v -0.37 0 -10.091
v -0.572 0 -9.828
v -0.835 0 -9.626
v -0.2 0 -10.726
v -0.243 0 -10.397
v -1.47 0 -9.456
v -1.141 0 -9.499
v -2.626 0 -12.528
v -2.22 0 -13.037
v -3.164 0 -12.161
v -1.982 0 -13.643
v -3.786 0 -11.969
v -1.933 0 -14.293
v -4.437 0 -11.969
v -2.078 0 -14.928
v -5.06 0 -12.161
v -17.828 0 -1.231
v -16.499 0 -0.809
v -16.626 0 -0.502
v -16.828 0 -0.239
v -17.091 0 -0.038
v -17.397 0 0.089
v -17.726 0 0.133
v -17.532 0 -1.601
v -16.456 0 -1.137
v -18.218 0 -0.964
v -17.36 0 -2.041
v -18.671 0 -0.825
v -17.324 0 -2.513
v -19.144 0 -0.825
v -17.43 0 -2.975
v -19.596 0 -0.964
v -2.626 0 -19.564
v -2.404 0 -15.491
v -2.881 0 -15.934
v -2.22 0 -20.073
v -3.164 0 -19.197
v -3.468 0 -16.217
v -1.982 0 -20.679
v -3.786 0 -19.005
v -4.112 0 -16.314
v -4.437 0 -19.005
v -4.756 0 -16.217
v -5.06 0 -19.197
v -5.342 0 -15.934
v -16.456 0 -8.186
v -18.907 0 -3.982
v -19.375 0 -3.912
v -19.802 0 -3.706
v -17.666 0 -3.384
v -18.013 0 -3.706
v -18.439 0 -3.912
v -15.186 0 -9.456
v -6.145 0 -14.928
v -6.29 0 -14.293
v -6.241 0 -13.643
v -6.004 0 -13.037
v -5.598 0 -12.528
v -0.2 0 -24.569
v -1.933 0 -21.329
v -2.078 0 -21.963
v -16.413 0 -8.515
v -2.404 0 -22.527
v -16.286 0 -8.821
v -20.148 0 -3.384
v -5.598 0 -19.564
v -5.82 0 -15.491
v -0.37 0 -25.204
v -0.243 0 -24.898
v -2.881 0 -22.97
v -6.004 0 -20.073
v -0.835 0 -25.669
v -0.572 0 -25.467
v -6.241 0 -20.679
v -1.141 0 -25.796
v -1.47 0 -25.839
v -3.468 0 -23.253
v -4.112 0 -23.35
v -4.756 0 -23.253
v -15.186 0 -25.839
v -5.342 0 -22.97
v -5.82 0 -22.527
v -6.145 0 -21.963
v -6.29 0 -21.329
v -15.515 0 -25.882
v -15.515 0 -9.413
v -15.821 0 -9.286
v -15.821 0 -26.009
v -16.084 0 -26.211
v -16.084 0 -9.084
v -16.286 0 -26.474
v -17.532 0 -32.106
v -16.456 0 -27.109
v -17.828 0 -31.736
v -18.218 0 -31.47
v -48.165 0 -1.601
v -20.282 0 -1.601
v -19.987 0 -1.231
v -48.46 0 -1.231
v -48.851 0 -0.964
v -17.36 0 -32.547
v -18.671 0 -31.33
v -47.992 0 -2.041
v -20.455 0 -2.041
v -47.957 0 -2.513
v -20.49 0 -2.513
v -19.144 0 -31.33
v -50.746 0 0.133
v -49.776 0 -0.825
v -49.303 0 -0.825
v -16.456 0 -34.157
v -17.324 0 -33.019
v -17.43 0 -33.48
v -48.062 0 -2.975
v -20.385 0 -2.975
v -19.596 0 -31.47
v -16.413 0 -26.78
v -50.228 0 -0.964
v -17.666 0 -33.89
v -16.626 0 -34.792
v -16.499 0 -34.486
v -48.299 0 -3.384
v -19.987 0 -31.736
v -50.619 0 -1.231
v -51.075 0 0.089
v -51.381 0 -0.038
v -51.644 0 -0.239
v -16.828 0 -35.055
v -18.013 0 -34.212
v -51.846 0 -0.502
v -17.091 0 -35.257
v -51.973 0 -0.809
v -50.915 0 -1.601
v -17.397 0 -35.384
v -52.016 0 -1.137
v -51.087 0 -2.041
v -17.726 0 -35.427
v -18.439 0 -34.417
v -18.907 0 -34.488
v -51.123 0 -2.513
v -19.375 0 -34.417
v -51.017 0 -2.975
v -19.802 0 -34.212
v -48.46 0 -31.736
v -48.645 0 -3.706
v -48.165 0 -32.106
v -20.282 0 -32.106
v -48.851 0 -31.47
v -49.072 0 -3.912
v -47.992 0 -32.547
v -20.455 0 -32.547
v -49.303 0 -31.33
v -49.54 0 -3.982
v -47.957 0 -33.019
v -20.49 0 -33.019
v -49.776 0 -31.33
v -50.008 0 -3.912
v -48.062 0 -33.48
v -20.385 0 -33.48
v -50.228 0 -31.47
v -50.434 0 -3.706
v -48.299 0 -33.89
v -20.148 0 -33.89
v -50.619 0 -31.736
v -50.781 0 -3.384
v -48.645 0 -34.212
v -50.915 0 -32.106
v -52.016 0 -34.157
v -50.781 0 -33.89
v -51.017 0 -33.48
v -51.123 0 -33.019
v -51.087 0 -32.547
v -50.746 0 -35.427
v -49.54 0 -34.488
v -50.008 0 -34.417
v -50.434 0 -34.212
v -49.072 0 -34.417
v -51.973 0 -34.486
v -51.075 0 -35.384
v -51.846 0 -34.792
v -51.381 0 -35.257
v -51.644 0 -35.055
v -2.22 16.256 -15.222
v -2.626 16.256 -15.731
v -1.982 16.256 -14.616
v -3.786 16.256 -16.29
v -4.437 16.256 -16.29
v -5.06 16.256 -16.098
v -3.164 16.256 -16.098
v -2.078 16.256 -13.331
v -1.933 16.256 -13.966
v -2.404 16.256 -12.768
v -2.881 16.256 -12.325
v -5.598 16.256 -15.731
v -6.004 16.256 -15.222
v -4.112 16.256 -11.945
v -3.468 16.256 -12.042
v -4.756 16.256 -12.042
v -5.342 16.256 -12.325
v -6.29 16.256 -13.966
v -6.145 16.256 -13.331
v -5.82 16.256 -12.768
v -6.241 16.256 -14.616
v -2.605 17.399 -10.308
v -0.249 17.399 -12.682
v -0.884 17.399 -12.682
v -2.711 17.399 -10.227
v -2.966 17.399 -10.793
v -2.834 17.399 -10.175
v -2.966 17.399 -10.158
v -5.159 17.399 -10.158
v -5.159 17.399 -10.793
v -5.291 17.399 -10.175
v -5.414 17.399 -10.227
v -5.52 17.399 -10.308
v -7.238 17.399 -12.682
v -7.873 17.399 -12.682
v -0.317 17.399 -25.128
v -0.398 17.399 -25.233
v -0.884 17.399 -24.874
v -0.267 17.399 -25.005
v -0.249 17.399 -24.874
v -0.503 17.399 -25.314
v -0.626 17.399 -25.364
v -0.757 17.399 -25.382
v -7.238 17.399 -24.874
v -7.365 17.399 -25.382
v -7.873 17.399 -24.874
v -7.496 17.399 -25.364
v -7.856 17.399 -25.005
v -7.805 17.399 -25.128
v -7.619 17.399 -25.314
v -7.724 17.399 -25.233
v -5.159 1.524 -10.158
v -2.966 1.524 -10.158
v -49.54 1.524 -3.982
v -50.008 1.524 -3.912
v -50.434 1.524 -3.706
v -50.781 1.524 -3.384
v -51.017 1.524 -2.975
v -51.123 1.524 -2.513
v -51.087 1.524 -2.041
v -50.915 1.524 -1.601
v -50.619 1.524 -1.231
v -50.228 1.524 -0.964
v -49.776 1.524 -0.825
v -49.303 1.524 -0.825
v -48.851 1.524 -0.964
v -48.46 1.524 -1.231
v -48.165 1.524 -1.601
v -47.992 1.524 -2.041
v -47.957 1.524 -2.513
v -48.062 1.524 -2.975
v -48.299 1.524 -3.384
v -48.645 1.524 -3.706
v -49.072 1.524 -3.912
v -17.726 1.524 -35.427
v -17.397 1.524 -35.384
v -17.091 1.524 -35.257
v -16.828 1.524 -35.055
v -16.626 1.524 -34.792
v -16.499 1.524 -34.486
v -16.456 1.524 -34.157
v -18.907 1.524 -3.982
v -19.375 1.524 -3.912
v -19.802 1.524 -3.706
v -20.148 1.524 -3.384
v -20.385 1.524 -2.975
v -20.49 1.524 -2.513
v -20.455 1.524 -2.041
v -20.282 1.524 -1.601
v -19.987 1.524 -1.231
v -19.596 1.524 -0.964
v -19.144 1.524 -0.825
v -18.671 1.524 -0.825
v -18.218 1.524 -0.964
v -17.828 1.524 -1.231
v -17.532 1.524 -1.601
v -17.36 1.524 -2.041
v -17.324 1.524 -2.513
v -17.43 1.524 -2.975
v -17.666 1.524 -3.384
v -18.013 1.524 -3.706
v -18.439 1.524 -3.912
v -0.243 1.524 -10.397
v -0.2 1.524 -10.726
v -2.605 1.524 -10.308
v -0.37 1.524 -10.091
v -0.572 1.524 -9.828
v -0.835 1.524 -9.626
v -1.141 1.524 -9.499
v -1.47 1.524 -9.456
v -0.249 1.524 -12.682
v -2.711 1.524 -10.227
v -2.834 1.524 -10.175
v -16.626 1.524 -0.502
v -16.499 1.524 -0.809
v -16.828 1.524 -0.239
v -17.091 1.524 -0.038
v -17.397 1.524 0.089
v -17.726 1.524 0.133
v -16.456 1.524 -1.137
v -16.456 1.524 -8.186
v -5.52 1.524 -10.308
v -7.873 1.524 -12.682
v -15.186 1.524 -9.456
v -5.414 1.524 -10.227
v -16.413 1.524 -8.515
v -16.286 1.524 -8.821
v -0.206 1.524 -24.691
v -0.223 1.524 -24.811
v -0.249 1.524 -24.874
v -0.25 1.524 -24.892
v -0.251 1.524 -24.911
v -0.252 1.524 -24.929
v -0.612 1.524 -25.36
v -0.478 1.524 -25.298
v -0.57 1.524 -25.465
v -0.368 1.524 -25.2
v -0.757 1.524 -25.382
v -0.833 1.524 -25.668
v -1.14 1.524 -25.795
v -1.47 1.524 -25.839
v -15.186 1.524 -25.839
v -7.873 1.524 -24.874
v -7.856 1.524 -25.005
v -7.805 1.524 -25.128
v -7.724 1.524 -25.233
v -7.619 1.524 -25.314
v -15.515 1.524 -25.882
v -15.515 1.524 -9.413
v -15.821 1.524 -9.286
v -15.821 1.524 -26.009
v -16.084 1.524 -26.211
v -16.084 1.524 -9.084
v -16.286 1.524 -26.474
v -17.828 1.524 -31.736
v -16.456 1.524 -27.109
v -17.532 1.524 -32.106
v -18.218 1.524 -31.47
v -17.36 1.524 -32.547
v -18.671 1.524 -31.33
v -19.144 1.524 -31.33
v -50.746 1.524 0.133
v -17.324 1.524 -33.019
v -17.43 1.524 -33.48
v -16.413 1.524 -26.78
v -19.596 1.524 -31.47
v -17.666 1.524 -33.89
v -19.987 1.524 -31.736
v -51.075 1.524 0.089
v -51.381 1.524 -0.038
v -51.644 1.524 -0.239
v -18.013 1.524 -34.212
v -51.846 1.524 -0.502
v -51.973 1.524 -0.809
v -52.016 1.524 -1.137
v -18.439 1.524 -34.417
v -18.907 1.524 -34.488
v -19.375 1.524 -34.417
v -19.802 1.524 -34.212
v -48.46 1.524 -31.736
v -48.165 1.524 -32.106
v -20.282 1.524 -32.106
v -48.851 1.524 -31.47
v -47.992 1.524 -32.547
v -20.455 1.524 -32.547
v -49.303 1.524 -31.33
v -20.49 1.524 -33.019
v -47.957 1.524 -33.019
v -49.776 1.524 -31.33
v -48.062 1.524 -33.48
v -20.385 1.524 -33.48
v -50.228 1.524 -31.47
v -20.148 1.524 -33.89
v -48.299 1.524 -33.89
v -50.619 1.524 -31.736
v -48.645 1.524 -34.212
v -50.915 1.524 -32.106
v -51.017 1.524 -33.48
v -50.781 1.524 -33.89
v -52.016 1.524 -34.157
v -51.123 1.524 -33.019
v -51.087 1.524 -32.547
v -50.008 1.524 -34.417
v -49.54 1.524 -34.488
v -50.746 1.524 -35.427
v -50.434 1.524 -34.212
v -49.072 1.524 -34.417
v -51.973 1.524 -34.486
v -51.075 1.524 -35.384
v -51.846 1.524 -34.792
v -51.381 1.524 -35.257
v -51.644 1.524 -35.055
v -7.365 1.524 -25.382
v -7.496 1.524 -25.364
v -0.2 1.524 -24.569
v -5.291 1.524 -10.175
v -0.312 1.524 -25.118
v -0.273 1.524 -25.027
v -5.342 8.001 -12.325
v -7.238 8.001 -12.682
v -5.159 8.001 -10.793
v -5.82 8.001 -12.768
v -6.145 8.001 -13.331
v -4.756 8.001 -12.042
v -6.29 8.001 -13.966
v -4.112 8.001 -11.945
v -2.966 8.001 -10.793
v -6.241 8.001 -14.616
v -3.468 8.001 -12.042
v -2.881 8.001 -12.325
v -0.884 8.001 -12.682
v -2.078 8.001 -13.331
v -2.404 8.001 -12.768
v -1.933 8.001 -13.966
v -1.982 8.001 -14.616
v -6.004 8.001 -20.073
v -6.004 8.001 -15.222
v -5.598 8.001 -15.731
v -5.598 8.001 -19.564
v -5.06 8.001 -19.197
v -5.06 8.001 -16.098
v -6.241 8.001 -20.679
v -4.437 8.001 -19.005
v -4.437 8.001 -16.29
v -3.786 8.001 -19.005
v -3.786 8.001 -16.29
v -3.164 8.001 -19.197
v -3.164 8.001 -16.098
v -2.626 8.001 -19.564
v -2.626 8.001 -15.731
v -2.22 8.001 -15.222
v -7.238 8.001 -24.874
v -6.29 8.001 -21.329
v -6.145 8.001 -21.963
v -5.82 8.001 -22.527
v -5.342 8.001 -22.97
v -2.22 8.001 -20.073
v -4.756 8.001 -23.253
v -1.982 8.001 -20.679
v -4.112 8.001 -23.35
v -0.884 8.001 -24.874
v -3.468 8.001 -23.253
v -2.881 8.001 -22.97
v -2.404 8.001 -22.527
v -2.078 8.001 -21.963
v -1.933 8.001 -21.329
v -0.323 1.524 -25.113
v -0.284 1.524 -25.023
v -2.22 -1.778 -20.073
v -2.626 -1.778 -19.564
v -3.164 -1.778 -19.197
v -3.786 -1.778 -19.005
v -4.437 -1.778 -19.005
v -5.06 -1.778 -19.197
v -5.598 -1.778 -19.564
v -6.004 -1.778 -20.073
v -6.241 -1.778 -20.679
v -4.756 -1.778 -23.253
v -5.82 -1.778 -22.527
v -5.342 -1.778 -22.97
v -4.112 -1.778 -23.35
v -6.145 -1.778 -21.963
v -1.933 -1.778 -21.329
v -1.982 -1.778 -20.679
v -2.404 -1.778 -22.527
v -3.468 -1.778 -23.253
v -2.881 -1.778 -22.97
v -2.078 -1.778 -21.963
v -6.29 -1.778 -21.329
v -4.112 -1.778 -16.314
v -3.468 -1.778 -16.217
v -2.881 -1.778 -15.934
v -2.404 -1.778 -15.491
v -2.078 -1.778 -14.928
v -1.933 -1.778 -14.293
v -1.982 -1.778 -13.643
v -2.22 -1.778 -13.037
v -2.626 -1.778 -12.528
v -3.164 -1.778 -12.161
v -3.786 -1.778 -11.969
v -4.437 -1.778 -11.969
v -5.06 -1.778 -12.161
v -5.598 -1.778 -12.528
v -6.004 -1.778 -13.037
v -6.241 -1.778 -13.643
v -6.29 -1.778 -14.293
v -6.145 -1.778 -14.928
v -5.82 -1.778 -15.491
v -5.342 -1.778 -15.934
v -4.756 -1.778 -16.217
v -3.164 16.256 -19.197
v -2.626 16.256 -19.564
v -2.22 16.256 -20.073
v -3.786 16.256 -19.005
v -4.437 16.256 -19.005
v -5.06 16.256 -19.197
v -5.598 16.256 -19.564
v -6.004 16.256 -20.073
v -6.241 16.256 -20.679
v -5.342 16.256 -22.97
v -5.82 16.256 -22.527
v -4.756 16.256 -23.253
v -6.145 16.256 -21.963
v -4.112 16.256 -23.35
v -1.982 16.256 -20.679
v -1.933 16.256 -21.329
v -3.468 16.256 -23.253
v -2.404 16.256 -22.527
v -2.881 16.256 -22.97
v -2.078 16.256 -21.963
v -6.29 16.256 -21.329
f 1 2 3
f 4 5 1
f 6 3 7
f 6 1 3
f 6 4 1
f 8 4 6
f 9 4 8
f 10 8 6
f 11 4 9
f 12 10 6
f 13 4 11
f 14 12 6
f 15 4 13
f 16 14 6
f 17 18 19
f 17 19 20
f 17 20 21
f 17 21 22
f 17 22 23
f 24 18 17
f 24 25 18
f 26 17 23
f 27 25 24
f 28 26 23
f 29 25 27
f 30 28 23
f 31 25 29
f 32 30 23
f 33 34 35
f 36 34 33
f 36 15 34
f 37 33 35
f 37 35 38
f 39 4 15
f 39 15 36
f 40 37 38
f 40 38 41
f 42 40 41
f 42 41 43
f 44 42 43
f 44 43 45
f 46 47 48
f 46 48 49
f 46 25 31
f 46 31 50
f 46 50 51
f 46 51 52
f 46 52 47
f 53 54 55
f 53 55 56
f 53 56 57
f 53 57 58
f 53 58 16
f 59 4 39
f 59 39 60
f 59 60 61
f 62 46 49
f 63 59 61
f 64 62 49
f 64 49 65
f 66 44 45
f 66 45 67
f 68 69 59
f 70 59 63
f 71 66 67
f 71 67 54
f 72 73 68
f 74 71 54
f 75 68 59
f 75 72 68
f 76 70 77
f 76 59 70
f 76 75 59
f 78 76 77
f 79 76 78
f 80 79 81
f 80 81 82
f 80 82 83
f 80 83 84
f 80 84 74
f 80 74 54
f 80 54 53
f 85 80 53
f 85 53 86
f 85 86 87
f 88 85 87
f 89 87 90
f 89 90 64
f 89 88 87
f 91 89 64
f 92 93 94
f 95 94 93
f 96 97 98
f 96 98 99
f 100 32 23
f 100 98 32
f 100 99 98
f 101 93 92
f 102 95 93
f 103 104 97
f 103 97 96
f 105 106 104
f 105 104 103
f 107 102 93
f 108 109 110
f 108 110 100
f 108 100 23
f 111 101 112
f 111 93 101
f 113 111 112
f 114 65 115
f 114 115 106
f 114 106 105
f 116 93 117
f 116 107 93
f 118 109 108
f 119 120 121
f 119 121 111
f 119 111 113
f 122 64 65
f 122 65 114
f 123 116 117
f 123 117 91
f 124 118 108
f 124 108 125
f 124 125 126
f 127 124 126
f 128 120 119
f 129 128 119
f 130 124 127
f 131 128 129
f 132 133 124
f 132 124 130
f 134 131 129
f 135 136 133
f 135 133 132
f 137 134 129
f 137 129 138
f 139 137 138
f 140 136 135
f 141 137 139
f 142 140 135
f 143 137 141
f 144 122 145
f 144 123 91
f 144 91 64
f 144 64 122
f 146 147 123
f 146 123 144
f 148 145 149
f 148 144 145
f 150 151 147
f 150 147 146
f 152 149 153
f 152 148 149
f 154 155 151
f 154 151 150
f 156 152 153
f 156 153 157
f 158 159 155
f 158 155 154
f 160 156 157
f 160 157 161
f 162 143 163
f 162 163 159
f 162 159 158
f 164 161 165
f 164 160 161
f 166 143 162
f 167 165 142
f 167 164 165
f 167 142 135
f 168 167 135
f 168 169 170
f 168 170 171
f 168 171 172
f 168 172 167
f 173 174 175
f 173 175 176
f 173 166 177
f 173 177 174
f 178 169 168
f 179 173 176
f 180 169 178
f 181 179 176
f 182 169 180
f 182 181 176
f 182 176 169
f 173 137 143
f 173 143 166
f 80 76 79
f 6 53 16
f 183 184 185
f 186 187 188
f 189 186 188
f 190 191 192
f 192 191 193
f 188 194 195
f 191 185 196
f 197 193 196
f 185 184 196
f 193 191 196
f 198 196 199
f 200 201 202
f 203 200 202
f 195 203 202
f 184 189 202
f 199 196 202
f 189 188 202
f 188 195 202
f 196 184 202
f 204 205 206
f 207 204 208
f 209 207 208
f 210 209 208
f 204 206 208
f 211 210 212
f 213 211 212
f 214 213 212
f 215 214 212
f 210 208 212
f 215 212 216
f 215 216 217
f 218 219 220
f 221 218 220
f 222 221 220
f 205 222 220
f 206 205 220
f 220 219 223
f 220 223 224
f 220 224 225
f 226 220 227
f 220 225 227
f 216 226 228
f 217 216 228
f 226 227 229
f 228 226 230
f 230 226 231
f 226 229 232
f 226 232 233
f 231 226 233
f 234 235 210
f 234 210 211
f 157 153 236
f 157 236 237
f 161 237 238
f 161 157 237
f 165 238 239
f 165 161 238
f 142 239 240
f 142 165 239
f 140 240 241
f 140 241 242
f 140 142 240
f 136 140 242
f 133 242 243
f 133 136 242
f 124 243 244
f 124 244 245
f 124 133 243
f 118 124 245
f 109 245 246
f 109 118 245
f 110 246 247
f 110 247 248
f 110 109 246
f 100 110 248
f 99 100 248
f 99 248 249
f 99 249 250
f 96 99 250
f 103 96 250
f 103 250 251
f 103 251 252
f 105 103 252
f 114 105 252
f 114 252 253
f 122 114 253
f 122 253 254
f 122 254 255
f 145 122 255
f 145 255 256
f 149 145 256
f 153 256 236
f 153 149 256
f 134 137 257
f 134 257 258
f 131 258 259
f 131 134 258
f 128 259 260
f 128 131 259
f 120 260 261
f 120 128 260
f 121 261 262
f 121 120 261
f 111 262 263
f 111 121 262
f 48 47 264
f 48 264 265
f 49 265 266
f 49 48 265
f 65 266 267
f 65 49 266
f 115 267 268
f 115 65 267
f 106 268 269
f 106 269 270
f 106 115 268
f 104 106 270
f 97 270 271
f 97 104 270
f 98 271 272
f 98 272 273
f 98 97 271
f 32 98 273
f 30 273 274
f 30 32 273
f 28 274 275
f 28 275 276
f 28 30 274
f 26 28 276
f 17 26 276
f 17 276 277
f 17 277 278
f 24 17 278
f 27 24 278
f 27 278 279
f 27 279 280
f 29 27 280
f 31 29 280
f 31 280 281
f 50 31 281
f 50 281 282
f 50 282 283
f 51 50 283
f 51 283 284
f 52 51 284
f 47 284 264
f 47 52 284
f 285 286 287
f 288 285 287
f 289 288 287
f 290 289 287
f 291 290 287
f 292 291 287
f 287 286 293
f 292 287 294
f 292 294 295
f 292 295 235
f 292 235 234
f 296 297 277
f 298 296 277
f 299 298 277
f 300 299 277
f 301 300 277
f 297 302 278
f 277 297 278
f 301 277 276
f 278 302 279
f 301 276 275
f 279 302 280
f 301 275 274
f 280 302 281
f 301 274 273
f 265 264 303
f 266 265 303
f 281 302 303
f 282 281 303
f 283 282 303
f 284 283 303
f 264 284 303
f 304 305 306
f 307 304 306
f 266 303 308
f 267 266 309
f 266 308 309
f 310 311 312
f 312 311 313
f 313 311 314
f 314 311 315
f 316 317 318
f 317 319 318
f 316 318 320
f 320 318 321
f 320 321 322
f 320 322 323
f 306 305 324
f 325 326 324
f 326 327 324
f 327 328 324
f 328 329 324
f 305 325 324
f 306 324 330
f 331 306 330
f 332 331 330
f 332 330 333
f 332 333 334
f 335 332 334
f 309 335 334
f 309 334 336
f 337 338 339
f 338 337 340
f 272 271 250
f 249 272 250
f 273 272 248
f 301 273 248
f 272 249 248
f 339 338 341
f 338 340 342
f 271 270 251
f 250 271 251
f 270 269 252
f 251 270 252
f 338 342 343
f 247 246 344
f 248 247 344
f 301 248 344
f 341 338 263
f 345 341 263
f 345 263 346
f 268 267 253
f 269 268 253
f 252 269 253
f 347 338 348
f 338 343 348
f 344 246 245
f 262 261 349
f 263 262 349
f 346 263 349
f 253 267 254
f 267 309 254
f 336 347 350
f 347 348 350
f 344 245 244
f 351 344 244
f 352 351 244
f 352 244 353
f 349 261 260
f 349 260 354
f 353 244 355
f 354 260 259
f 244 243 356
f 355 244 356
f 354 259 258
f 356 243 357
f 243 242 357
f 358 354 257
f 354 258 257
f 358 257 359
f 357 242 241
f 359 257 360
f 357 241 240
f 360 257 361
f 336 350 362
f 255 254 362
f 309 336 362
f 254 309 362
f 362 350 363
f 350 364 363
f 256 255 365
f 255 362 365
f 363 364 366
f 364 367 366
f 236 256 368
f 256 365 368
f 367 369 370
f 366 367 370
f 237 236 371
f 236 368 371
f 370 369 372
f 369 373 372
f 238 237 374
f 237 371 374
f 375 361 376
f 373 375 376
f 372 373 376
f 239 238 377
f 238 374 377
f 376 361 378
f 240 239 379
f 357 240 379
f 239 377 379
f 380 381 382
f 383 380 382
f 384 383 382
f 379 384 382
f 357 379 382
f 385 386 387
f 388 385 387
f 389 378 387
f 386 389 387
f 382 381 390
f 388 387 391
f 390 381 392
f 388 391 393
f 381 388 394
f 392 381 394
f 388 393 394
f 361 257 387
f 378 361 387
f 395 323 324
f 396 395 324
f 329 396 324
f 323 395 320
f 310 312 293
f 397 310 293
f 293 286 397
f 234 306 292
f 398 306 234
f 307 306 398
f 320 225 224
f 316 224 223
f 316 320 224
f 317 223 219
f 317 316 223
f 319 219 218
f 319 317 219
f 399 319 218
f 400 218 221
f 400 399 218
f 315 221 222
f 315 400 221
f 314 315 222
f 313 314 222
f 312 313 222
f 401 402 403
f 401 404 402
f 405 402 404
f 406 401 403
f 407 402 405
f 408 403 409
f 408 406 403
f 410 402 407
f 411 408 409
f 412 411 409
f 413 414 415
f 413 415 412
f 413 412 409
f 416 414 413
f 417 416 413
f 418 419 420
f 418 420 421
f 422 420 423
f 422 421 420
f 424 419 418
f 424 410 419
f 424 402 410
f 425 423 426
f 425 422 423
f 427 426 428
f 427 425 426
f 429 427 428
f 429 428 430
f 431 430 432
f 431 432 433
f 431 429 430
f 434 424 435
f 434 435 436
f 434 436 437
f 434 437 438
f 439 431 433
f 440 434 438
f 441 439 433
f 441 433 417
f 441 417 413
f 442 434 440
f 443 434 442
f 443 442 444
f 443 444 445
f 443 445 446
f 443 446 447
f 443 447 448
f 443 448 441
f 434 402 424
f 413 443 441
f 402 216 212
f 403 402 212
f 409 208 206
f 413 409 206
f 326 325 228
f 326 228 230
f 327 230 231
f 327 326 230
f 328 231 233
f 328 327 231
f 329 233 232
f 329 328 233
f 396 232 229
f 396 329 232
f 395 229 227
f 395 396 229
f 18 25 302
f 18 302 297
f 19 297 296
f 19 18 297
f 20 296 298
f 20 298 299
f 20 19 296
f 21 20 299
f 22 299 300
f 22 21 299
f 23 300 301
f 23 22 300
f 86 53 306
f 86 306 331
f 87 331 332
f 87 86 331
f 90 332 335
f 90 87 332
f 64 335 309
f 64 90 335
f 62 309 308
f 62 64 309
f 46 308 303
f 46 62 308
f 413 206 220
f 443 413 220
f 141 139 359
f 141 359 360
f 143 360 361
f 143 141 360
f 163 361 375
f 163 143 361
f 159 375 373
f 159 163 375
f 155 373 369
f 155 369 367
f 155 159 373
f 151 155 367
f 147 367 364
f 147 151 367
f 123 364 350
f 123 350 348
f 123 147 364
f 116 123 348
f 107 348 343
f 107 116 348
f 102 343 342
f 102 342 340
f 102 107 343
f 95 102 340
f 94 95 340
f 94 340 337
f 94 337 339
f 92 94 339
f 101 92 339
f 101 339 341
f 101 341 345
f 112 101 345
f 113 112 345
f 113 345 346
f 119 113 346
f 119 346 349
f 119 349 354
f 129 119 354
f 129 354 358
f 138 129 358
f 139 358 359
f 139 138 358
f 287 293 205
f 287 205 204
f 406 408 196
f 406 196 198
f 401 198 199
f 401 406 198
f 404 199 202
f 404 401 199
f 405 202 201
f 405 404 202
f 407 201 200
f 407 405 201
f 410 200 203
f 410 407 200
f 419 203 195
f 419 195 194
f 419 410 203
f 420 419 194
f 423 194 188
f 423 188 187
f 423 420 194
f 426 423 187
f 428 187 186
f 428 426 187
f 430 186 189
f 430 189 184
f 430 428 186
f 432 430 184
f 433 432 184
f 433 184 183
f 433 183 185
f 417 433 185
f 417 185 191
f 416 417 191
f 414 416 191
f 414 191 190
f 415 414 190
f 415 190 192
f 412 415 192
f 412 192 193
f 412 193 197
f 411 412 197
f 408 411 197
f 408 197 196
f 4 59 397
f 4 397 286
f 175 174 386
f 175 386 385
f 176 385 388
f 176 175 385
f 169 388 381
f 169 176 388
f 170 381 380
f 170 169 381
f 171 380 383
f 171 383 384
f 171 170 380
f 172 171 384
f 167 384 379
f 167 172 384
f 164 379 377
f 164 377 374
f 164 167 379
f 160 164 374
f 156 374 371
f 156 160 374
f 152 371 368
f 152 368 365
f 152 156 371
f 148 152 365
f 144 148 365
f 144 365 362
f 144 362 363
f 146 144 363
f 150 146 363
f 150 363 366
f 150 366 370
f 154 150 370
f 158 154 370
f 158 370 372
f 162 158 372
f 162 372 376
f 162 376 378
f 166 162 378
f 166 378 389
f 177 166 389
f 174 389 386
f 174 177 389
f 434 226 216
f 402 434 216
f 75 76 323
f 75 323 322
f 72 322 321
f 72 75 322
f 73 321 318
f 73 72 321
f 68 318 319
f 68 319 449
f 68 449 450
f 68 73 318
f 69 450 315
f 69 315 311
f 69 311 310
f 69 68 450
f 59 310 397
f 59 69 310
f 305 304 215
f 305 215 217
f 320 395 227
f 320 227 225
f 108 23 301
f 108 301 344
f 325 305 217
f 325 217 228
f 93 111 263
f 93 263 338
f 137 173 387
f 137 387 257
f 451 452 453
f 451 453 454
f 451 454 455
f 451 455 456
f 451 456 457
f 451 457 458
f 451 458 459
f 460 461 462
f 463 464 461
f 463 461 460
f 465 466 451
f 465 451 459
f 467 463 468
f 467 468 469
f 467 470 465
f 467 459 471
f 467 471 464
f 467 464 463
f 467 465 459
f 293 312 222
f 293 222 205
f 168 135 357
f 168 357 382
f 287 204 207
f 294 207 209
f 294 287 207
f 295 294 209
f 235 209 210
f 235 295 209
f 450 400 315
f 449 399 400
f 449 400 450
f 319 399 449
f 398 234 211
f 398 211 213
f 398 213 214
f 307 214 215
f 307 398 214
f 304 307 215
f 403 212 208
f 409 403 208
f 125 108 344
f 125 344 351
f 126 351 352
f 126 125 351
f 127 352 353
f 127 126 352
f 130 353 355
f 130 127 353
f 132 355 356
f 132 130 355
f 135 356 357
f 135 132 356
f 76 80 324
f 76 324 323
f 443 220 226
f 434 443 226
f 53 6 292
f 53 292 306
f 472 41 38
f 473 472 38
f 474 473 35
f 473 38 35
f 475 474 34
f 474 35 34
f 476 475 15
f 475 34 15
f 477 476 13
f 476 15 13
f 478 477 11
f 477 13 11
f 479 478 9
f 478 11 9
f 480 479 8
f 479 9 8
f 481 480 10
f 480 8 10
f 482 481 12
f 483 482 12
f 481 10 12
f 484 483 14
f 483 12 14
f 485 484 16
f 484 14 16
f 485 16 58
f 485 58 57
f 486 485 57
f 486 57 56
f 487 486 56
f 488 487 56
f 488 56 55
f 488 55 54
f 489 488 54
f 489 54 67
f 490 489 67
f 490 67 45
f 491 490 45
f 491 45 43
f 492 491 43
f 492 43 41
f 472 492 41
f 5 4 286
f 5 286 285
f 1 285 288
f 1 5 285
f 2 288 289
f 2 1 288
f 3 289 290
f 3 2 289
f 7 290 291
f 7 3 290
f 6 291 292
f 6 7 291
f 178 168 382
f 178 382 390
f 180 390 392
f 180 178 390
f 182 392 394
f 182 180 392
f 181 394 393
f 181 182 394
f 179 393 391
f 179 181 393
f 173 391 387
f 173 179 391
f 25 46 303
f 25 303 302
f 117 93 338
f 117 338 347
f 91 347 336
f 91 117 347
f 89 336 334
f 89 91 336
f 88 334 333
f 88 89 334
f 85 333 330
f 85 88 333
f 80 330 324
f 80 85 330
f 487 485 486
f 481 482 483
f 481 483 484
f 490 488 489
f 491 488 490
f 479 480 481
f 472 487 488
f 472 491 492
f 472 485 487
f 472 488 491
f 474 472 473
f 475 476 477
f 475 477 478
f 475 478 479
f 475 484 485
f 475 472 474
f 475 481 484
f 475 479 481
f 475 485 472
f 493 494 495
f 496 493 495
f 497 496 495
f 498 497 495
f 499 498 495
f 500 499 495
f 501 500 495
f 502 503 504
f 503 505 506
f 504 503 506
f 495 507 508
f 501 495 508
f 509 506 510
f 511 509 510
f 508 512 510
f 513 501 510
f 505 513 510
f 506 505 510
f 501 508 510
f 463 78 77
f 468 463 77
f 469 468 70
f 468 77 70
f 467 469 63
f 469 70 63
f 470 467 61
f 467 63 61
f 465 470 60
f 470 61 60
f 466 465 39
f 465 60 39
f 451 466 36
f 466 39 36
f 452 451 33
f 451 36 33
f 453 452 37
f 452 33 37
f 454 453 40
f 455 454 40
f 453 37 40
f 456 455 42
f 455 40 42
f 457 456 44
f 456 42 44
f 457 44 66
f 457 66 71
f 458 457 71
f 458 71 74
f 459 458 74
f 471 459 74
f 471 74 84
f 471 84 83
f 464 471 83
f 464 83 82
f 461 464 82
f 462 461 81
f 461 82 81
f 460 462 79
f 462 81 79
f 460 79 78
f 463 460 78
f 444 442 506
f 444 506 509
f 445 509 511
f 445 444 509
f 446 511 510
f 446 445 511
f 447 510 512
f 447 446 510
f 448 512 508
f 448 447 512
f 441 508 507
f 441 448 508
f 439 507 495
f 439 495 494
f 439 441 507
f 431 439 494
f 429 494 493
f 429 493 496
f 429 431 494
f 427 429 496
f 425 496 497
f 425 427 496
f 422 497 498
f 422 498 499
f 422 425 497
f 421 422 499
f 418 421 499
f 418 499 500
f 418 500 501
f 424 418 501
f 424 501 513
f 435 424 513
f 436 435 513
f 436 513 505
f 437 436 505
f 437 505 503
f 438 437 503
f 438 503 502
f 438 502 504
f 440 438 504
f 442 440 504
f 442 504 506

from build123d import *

# Parameters (mm, degrees)
SKETCH1_R             = 1.5875
SKETCH1_R_2           = 2.1844
BOSS_EXTRUDE2_DEPTH   = 1.524
BOSS_EXTRUDE3_DEPTH   = 15.875
SKETCH3_R             = 2.1844
BOSS_EXTRUDE4_DEPTH   = 1.778
BOSS_EXTRUDE4_2_DEPTH = 1.778
CUT_EXTRUDE1_DEPTH    = 9.398
SKETCH6_R             = 2.1844
BOSS_EXTRUDE5_DEPTH   = 16.256


with BuildPart() as part:
    # Sketch1 → Boss-Extrude2 (new body)
    with BuildSketch(Plane(origin=(0, 0, 0), x_dir=(1, 0, 0), z_dir=(0, 1, 0))):
        with BuildLine():
            Line((-50.746188486, 35.427401309), (-17.726188486, 35.427401309))
            ThreePointArc((-17.726188486, 35.427401309), (-16.828162874, 35.055426921), (-16.456188486, 34.157401309))
            Line((-16.456188486, 34.157401309), (-16.456188486, 27.108901309))
            ThreePointArc((-16.456188486, 27.108901309), (-16.084214098, 26.210875697), (-15.186188486, 25.838901309))
            Line((-15.186188486, 25.838901309), (-1.470188486, 25.838901309))
            ThreePointArc((-1.470188486, 25.838901309), (-0.572162874, 25.466926921), (-0.200188486, 24.568901309))
            Line((-0.200188486, 24.568901309), (-0.200188486, 10.725901309))
            ThreePointArc((-0.200188486, 10.725901309), (-0.572162874, 9.827875697), (-1.470188486, 9.455901309))
            Line((-1.470188486, 9.455901309), (-15.186188486, 9.455901309))
            ThreePointArc((-15.186188486, 9.455901309), (-16.084214098, 9.083926921), (-16.456188486, 8.185901309))
            Line((-16.456188486, 8.185901309), (-16.456188486, 1.137401309))
            ThreePointArc((-16.456188486, 1.137401309), (-16.828162874, 0.239375697), (-17.726188486, -0.132598691))
            Line((-17.726188486, -0.132598691), (-50.746188486, -0.132598691))
            ThreePointArc((-50.746188486, -0.132598691), (-51.644214098, 0.239375697), (-52.016188486, 1.137401309))
            Line((-52.016188486, 1.137401309), (-52.016188486, 34.157401309))
            ThreePointArc((-52.016188486, 34.157401309), (-51.644214098, 35.055426921), (-50.746188486, 35.427401309))
        make_face()
        with Locations(Location((-49.539688486, 32.900101309, 0), (0, 0, 90))):
            Circle(SKETCH1_R, mode=Mode.SUBTRACT)
        with Locations(Location((-18.907288486, 32.900101309, 0), (0, 0, 90))):
            Circle(SKETCH1_R, mode=Mode.SUBTRACT)
        with Locations(Location((-18.907288486, 2.394701309, 0), (0, 0, 90))):
            Circle(SKETCH1_R, mode=Mode.SUBTRACT)
        with Locations(Location((-49.539688486, 2.394701309, 0), (0, 0, 90))):
            Circle(SKETCH1_R, mode=Mode.SUBTRACT)
        with Locations(Location((-4.111788486, 21.165301309, 0), (0, 0, 90))):
            Circle(SKETCH1_R_2, mode=Mode.SUBTRACT)
        with Locations(Location((-4.111788486, 14.129501309, 0), (0, 0, 90))):
            Circle(SKETCH1_R_2, mode=Mode.SUBTRACT)
    extrude(amount=BOSS_EXTRUDE2_DEPTH)

    # Sketch2 → Boss-Extrude3 (add)
    with BuildSketch(Plane(origin=(0, 1.524, 0), x_dir=(1, 0, 0), z_dir=(0, 1, 0))):
        with BuildLine():
            Line((-0.249338446, 12.681643767), (-2.605441809, 10.307979525))
            ThreePointArc((-2.605441809, 10.307979525), (-2.77070914, 10.196884511), (-2.96598326, 10.157853612))
            Line((-2.96598326, 10.157853612), (-5.158955649, 10.157853612))
            ThreePointArc((-5.158955649, 10.157853612), (-5.354367589, 10.196941921), (-5.519707394, 10.308191511))
            Line((-5.519707394, 10.308191511), (-7.872832313, 12.681643767))
            Line((-7.872832313, 12.681643767), (-7.872832313, 24.873643767))
            ThreePointArc((-7.872832313, 24.873643767), (-7.724042558, 25.232854011), (-7.364832313, 25.381643767))
            Line((-7.364832313, 25.381643767), (-0.757338446, 25.381643767))
            ThreePointArc((-0.757338446, 25.381643767), (-0.398128202, 25.232854011), (-0.249338446, 24.873643767))
            Line((-0.249338446, 24.873643767), (-0.249338446, 12.681643767))
        make_face()
    extrude(amount=BOSS_EXTRUDE3_DEPTH)

    # Sketch4 → Cut-Extrude1 (cut)
    with BuildSketch(Plane(origin=(0, 17.399, 0), x_dir=(1, 0, 0), z_dir=(0, 1, 0))):
        Polygon((-7.237832313, 24.873643767), (-7.237832313, 12.681643767), (-5.158955649, 10.792853612), (-2.96598326, 10.792853612), (-0.884338446, 12.681643767), (-0.884338446, 24.873643767), align=None)
    extrude(amount=-CUT_EXTRUDE1_DEPTH, mode=Mode.SUBTRACT)



with BuildPart() as body_2:
    # Sketch3 → Boss-Extrude4 (new body)
    with BuildSketch(Plane.XZ):
        with Locations(Location((-4.111788486, -14.129501309, 0), (0, 0, 270))):
            Circle(SKETCH3_R)
    extrude(amount=BOSS_EXTRUDE4_DEPTH)


with BuildPart() as body_3:
    # Sketch3 → Boss-Extrude4 2 (new body)
    with BuildSketch(Plane.XZ):
        with Locations(Location((-4.111788486, -21.165301309, 0), (0, 0, 270))):
            Circle(SKETCH3_R)
    extrude(amount=BOSS_EXTRUDE4_2_DEPTH)


with BuildPart() as part_1:
    add(part.part)

    add(body_2.part)  # Boss-Extrude5 merges body 2

    add(body_3.part)  # Boss-Extrude5 merges body 3
    # Sketch6 → Boss-Extrude5 (add)
    with BuildSketch(Plane.XZ):
        with Locations(Location((-4.111788486, -14.129501309, 0), (0, 0, 90))):
            Circle(SKETCH6_R)
        with Locations(Location((-4.111788486, -21.165301309, 0), (0, 0, 270))):
            Circle(SKETCH6_R)
    extrude(amount=-BOSS_EXTRUDE5_DEPTH)


solid = part_1.part
